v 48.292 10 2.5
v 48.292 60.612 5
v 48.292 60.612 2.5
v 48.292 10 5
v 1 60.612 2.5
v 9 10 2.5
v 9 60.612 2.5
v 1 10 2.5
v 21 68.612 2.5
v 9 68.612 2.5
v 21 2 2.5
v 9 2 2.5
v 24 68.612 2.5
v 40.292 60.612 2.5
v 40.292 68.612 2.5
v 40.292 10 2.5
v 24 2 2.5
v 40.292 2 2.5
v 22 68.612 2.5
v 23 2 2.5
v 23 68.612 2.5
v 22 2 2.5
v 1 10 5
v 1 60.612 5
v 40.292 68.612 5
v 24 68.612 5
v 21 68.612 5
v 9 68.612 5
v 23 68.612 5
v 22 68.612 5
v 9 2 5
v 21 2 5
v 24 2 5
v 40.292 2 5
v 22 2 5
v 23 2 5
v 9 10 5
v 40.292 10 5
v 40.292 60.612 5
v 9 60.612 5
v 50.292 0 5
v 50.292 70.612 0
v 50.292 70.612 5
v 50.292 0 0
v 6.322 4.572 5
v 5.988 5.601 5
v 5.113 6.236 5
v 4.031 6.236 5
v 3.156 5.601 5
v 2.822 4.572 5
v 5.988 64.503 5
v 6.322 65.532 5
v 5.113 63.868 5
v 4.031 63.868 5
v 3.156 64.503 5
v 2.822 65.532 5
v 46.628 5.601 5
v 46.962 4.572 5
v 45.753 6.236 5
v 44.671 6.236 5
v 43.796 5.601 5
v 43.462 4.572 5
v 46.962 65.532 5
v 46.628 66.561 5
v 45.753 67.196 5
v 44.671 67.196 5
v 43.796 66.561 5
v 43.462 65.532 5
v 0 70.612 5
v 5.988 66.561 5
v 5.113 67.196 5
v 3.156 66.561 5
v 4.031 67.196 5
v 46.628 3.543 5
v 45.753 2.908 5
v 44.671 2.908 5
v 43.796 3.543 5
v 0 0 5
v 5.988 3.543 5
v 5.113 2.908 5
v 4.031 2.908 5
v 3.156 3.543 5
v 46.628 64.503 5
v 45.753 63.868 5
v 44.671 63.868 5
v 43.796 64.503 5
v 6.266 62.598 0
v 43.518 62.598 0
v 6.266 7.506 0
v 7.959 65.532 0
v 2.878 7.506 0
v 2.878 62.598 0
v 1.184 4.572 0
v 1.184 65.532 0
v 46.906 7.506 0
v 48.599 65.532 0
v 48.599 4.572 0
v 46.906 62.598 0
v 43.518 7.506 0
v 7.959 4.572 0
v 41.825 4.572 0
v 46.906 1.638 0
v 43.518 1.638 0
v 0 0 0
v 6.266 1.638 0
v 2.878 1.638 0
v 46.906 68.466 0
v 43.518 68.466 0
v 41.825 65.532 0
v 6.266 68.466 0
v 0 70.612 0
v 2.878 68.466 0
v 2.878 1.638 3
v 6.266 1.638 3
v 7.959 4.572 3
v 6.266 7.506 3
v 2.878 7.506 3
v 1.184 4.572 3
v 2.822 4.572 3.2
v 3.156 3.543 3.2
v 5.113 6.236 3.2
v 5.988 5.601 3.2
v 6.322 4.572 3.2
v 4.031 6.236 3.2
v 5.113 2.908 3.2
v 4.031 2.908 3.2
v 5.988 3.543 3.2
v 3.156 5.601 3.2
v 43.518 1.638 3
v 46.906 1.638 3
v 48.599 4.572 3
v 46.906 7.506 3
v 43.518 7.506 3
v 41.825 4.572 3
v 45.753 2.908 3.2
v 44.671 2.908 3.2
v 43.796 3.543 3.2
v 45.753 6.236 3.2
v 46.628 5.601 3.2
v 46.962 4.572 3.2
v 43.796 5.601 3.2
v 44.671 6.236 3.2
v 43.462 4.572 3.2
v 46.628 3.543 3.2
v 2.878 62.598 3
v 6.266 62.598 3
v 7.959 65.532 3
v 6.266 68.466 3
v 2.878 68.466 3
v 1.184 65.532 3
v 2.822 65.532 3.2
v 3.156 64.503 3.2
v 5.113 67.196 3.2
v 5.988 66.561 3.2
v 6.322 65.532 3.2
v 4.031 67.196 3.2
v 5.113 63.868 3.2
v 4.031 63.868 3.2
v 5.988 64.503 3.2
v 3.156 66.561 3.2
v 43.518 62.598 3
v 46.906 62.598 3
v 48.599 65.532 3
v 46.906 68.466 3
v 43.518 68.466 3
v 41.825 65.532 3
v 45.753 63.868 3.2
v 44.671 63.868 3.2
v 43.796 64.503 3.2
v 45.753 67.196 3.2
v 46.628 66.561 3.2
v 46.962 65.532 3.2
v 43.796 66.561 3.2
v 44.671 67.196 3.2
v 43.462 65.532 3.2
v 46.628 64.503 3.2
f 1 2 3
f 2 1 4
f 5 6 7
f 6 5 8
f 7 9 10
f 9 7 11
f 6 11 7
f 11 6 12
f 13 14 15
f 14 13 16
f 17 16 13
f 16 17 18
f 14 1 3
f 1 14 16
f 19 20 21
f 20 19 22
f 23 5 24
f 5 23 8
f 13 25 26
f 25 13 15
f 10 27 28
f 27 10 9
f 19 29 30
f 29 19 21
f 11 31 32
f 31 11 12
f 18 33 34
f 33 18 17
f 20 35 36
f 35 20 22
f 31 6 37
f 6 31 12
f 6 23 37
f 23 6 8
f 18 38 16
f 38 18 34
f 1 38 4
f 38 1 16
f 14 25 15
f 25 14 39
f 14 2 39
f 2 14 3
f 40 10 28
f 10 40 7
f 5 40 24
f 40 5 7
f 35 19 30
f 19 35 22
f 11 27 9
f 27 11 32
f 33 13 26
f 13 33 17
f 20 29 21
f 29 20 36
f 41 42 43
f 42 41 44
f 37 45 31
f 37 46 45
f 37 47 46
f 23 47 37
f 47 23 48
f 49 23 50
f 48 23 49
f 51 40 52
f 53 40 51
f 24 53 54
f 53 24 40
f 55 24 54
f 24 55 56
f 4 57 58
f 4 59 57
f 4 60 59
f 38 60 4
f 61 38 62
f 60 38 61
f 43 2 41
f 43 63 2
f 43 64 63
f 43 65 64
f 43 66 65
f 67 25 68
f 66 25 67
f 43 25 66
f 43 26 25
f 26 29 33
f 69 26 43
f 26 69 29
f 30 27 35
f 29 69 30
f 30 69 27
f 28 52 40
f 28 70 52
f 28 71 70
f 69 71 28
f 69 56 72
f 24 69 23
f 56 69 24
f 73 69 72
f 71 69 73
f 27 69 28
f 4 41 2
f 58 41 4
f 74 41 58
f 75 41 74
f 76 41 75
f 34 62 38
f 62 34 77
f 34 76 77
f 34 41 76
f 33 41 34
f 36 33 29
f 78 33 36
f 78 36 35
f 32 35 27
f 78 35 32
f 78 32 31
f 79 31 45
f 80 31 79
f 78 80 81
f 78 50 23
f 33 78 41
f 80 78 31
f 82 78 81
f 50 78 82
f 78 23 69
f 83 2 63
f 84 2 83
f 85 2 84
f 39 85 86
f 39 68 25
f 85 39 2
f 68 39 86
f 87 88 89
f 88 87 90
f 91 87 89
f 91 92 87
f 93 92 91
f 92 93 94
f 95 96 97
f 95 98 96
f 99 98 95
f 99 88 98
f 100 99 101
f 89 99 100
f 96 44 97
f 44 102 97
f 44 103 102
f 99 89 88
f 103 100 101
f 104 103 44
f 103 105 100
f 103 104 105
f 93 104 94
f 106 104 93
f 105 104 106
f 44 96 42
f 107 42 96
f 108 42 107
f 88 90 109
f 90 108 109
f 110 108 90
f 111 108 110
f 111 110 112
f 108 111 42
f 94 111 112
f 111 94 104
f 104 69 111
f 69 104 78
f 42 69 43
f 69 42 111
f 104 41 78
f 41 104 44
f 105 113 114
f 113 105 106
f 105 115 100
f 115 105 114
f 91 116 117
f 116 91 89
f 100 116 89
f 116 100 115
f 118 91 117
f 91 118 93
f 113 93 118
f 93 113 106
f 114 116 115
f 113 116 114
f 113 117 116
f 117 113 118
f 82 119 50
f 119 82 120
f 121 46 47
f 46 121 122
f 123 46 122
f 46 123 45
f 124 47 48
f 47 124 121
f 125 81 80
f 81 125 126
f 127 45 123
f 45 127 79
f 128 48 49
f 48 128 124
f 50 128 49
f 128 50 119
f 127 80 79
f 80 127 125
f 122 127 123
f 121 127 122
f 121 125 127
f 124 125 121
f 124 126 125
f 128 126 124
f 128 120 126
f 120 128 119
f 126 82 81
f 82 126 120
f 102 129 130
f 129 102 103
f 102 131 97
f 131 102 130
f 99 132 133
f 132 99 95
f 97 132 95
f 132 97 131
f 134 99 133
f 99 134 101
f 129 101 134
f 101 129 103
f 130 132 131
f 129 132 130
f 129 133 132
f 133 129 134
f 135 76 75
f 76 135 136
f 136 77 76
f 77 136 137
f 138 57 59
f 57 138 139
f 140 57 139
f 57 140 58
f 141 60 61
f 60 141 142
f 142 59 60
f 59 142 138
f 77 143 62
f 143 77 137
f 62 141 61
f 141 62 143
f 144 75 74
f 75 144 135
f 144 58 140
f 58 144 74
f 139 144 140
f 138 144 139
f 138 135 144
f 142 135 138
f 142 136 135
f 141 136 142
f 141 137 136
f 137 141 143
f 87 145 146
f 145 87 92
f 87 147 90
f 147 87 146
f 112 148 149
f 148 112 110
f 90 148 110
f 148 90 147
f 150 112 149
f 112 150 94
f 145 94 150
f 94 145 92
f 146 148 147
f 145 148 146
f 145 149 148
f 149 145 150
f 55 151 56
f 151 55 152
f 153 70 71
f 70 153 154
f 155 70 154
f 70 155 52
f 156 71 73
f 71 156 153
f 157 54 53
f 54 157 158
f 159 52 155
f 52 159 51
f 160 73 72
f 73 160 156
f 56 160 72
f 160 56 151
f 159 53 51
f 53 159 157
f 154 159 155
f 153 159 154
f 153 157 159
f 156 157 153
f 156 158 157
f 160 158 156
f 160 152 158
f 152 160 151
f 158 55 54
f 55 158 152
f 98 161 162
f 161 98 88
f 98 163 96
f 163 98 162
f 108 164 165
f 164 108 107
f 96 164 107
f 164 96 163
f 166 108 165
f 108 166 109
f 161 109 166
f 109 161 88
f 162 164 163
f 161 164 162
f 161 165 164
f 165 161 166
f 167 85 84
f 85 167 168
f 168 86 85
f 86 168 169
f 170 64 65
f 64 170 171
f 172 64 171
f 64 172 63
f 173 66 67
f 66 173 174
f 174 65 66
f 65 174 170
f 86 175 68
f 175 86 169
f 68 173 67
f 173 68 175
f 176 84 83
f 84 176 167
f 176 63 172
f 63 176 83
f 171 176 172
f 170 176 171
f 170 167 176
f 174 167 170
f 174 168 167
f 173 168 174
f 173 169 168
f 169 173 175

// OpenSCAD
pedestal_height = 5;   // designed for use the MLAB standard 12mm screws.
mount_hole = 3.5;
clear = 0.175;
nut_size = 6.6;


difference () {
	cube([50.292,70.612,pedestal_height]);

	translate ([1, 2, 2.5])
	difference(){
		cube([47.292,66.612,pedestal_height]);

		cube([8,8,pedestal_height]);

   		translate ([47.292 - 8, 0, 0])
		cube([8,8,pedestal_height]);

   		translate ([47.292 - 8, 66.612 - 8, 0])
		cube([8,8,pedestal_height]);

   		translate ([0, 66.612 - 8, 0])
		cube([8,8,pedestal_height]);
               
                //insulating wall
   		translate ([20, 0, 0])
		cube([1,70,pedestal_height]);
   		translate ([22, 0, 0])
		cube([1,70,pedestal_height]);
            
	}

        ////////////////////////////////////////

// MLAB grid holes

   translate ([4.572, 4.572,0])
   cylinder (h = 3, r= (nut_size+clear)/2, $fn=6);
   translate ([4.572, 4.572, 3.2])  // one solid layer for slicer (the holes will be pierced on demand )
   cylinder (h = pedestal_height, r= mount_hole/2, $fn=10);

   translate ([4.572 + 4*10.16, 4.572,0])
   cylinder (h = 3, r= (nut_size+clear)/2, $fn=6);
   translate ([4.572 + 4*10.16, 4.572, 3.2])  // one solid layer for slicer (the holes will be pierced on demand )
   cylinder (h = pedestal_height, r= mount_hole/2, $fn=10);


   translate ([4.572, 4.572 + 6*10.16, 0])
   cylinder (h = 3, r= (nut_size+clear)/2, $fn=6);
   translate ([4.572, 4.572 + 6*10.16, 3.2])  // one solid layer for slicer (the holes will be pierced on demand )
   cylinder (h = pedestal_height, r= mount_hole/2, $fn=10);

   translate ([4.572 + 4*10.16, 4.572 + 6*10.16, 0])
   cylinder (h = 3, r= (nut_size+clear)/2, $fn=6);
   translate ([4.572 + 4*10.16, 4.572 + 6*10.16, 3.2])  // one solid layer for slicer (the holes will be pierced on demand )
   cylinder (h = pedestal_height, r= mount_hole/2, $fn=10);

}
